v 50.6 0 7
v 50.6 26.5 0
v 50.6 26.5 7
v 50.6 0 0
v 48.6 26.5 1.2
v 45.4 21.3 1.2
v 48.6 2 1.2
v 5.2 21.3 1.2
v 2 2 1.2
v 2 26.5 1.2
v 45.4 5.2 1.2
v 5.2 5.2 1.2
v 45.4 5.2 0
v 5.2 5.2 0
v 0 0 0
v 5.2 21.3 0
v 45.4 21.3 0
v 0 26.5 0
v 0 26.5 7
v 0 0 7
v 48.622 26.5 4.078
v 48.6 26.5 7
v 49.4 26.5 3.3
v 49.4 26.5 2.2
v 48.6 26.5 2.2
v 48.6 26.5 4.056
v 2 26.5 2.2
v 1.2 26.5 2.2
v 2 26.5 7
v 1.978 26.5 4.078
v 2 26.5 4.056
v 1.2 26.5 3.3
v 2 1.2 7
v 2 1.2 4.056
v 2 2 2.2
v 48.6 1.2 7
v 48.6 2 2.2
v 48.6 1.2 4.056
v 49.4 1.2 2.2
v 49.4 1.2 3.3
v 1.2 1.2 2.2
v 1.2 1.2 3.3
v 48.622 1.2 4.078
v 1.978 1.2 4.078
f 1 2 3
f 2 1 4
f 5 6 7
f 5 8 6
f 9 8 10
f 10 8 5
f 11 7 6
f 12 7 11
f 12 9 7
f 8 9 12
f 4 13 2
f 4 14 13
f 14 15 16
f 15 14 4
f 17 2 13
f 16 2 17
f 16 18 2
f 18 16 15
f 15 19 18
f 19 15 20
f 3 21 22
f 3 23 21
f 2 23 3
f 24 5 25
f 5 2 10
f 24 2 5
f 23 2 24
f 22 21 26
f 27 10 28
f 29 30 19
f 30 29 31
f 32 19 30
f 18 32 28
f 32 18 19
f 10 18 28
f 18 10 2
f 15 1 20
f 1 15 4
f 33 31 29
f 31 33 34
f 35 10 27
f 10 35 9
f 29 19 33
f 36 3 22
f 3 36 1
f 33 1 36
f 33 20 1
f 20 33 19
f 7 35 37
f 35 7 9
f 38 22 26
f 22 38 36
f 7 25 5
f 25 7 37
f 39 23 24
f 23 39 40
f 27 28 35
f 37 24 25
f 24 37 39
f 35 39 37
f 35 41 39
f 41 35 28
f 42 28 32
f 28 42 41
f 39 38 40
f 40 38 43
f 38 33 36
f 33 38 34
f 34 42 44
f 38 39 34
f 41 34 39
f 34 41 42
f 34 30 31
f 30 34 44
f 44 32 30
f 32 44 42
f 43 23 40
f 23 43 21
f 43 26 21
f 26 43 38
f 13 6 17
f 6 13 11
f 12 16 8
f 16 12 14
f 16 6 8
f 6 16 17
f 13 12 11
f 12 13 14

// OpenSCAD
// for led power module modified

/* bluetooth_mate_holder.scad
 * By John Biehler - November 17, 2011
 * http://www.thingiverse.com/thing: 

 * derived from pcb_box_slide_with_tabs.scad
 * By Nicholas C Lewis - Jan 1, 2011
 * http://www.thingiverse.com/thing:5396 
 *
 * derived from pcb_box_slide.scad 
 *     Parametric, open PCB-box (slide-in) by chlunde
 *     http://www.thingiverse.com/thing:4071
 *
 * CHANGES
 * - adjusted to fit Arduino Mega
 * - added mounting tabs
 * - turned off cutouts
 * - adjusted bottom cutout size
 */

$fn=50;

//Uno is 2.7" x 2.1" which is 68.58 mm x 53.34 mm
//Round up to 69 mm x 54 mm
pcb_width = 48.2;
pcb_length =24.1;
pcb_height =1.1;
slisse = 0.8;

pcb_bottom_margin = 1;
wall_width_thick = 2;
wall_width = wall_width_thick-slisse;
box_height = 7;

//tab parameters
tab_hole_radius=2;
tab_outer_radius=4;

inner_margin = 4;

module pcb_led_cvf() {


  difference() {
    box();
    pcb();
    holes();
  }


}

module tab() {
	difference(){
		union() {
			translate([-tab_outer_radius,-tab_outer_radius,0])
			cube([tab_outer_radius,2*tab_outer_radius,wall_width]);
			translate([-tab_outer_radius,0,0])
				cylinder(r=tab_outer_radius, h = wall_width);
		}
		translate([-tab_outer_radius,0,0])
		 cylinder(r= tab_hole_radius, h = wall_width+3,center=true);
	}

}

module box() {
  union() {
    cube([pcb_width + 2*wall_width, pcb_length + 2*wall_width, wall_width]);

    cube([wall_width_thick, pcb_length + 2*wall_width, box_height]);

    cube([pcb_width + 2*wall_width, wall_width_thick, box_height]);

//    %translate([0, pcb_length+wall_width, 0])
//      cube([pcb_width + 2*wall_width,wall_width,box_height]);

    translate([pcb_width + wall_width - slisse,0,0])
      cube([wall_width_thick, pcb_length + 2*wall_width, box_height]);
  }
//comment out this part to remove tabs
 for(i=[(pcb_length + 2*wall_width)/2]){
//	translate([0,i,0])tab();
//	translate([pcb_width + 2*wall_width,i,0])mirror()tab();
 }


}

module pcb() {
  translate([wall_width, wall_width, wall_width + pcb_bottom_margin])
    cube([pcb_width,pcb_length + wall_width + 0.1,pcb_height]);
  translate([wall_width, wall_width, wall_width + pcb_bottom_margin+pcb_height])rotate([0,45,0])
    cube([pcb_height,pcb_length + wall_width + 0.1,pcb_height]);
  translate([wall_width+pcb_width-2*cos(45)*pcb_height, wall_width, wall_width + pcb_bottom_margin+pcb_height])rotate([0,45,0])
    cube([pcb_height,pcb_length + wall_width + 0.1,pcb_height]);
  translate([wall_width_thick, wall_width, wall_width + pcb_bottom_margin])
    cube([pcb_width-2*slisse,pcb_length + wall_width + 0.1,box_height]);

}



module holes() {
    *translate([wall_width + pcb_width/2, wall_width_thick + 0.1, pcb_width/2+wall_width])
      rotate(a=90,v=[1,0,0])
        cylinder(r=pcb_width/2, h=wall_width_thick + 0.2);
  
    *translate([-0.1, wall_width + pcb_length/2, pcb_length/2 + wall_width])
      rotate(a=90,v=[0,1,0])
        cylinder(r=pcb_length/2, h=wall_width_thick + 0.2);
  
    *translate([pcb_width + wall_width - slisse - 0.1, wall_width + pcb_length/2, pcb_length/2 + wall_width])
      rotate(a=90,v=[0,1,0])
        cylinder(r=pcb_length/2, h=wall_width_thick + 0.2);
  
   * translate([pcb_width/2 + wall_width, wall_width + pcb_length/2, -0.1])
      rotate(a=0,v=[0,1,0])
        cylinder(r=min(pcb_length,pcb_width)/2 - wall_width/2, h=wall_width_thick + 0.2);
     
    translate([inner_margin +wall_width, inner_margin+wall_width, -0.1])
      cube([pcb_width-inner_margin*2,pcb_length -inner_margin*2,wall_width + 0.2]);
}


pcb_led_cvf();
